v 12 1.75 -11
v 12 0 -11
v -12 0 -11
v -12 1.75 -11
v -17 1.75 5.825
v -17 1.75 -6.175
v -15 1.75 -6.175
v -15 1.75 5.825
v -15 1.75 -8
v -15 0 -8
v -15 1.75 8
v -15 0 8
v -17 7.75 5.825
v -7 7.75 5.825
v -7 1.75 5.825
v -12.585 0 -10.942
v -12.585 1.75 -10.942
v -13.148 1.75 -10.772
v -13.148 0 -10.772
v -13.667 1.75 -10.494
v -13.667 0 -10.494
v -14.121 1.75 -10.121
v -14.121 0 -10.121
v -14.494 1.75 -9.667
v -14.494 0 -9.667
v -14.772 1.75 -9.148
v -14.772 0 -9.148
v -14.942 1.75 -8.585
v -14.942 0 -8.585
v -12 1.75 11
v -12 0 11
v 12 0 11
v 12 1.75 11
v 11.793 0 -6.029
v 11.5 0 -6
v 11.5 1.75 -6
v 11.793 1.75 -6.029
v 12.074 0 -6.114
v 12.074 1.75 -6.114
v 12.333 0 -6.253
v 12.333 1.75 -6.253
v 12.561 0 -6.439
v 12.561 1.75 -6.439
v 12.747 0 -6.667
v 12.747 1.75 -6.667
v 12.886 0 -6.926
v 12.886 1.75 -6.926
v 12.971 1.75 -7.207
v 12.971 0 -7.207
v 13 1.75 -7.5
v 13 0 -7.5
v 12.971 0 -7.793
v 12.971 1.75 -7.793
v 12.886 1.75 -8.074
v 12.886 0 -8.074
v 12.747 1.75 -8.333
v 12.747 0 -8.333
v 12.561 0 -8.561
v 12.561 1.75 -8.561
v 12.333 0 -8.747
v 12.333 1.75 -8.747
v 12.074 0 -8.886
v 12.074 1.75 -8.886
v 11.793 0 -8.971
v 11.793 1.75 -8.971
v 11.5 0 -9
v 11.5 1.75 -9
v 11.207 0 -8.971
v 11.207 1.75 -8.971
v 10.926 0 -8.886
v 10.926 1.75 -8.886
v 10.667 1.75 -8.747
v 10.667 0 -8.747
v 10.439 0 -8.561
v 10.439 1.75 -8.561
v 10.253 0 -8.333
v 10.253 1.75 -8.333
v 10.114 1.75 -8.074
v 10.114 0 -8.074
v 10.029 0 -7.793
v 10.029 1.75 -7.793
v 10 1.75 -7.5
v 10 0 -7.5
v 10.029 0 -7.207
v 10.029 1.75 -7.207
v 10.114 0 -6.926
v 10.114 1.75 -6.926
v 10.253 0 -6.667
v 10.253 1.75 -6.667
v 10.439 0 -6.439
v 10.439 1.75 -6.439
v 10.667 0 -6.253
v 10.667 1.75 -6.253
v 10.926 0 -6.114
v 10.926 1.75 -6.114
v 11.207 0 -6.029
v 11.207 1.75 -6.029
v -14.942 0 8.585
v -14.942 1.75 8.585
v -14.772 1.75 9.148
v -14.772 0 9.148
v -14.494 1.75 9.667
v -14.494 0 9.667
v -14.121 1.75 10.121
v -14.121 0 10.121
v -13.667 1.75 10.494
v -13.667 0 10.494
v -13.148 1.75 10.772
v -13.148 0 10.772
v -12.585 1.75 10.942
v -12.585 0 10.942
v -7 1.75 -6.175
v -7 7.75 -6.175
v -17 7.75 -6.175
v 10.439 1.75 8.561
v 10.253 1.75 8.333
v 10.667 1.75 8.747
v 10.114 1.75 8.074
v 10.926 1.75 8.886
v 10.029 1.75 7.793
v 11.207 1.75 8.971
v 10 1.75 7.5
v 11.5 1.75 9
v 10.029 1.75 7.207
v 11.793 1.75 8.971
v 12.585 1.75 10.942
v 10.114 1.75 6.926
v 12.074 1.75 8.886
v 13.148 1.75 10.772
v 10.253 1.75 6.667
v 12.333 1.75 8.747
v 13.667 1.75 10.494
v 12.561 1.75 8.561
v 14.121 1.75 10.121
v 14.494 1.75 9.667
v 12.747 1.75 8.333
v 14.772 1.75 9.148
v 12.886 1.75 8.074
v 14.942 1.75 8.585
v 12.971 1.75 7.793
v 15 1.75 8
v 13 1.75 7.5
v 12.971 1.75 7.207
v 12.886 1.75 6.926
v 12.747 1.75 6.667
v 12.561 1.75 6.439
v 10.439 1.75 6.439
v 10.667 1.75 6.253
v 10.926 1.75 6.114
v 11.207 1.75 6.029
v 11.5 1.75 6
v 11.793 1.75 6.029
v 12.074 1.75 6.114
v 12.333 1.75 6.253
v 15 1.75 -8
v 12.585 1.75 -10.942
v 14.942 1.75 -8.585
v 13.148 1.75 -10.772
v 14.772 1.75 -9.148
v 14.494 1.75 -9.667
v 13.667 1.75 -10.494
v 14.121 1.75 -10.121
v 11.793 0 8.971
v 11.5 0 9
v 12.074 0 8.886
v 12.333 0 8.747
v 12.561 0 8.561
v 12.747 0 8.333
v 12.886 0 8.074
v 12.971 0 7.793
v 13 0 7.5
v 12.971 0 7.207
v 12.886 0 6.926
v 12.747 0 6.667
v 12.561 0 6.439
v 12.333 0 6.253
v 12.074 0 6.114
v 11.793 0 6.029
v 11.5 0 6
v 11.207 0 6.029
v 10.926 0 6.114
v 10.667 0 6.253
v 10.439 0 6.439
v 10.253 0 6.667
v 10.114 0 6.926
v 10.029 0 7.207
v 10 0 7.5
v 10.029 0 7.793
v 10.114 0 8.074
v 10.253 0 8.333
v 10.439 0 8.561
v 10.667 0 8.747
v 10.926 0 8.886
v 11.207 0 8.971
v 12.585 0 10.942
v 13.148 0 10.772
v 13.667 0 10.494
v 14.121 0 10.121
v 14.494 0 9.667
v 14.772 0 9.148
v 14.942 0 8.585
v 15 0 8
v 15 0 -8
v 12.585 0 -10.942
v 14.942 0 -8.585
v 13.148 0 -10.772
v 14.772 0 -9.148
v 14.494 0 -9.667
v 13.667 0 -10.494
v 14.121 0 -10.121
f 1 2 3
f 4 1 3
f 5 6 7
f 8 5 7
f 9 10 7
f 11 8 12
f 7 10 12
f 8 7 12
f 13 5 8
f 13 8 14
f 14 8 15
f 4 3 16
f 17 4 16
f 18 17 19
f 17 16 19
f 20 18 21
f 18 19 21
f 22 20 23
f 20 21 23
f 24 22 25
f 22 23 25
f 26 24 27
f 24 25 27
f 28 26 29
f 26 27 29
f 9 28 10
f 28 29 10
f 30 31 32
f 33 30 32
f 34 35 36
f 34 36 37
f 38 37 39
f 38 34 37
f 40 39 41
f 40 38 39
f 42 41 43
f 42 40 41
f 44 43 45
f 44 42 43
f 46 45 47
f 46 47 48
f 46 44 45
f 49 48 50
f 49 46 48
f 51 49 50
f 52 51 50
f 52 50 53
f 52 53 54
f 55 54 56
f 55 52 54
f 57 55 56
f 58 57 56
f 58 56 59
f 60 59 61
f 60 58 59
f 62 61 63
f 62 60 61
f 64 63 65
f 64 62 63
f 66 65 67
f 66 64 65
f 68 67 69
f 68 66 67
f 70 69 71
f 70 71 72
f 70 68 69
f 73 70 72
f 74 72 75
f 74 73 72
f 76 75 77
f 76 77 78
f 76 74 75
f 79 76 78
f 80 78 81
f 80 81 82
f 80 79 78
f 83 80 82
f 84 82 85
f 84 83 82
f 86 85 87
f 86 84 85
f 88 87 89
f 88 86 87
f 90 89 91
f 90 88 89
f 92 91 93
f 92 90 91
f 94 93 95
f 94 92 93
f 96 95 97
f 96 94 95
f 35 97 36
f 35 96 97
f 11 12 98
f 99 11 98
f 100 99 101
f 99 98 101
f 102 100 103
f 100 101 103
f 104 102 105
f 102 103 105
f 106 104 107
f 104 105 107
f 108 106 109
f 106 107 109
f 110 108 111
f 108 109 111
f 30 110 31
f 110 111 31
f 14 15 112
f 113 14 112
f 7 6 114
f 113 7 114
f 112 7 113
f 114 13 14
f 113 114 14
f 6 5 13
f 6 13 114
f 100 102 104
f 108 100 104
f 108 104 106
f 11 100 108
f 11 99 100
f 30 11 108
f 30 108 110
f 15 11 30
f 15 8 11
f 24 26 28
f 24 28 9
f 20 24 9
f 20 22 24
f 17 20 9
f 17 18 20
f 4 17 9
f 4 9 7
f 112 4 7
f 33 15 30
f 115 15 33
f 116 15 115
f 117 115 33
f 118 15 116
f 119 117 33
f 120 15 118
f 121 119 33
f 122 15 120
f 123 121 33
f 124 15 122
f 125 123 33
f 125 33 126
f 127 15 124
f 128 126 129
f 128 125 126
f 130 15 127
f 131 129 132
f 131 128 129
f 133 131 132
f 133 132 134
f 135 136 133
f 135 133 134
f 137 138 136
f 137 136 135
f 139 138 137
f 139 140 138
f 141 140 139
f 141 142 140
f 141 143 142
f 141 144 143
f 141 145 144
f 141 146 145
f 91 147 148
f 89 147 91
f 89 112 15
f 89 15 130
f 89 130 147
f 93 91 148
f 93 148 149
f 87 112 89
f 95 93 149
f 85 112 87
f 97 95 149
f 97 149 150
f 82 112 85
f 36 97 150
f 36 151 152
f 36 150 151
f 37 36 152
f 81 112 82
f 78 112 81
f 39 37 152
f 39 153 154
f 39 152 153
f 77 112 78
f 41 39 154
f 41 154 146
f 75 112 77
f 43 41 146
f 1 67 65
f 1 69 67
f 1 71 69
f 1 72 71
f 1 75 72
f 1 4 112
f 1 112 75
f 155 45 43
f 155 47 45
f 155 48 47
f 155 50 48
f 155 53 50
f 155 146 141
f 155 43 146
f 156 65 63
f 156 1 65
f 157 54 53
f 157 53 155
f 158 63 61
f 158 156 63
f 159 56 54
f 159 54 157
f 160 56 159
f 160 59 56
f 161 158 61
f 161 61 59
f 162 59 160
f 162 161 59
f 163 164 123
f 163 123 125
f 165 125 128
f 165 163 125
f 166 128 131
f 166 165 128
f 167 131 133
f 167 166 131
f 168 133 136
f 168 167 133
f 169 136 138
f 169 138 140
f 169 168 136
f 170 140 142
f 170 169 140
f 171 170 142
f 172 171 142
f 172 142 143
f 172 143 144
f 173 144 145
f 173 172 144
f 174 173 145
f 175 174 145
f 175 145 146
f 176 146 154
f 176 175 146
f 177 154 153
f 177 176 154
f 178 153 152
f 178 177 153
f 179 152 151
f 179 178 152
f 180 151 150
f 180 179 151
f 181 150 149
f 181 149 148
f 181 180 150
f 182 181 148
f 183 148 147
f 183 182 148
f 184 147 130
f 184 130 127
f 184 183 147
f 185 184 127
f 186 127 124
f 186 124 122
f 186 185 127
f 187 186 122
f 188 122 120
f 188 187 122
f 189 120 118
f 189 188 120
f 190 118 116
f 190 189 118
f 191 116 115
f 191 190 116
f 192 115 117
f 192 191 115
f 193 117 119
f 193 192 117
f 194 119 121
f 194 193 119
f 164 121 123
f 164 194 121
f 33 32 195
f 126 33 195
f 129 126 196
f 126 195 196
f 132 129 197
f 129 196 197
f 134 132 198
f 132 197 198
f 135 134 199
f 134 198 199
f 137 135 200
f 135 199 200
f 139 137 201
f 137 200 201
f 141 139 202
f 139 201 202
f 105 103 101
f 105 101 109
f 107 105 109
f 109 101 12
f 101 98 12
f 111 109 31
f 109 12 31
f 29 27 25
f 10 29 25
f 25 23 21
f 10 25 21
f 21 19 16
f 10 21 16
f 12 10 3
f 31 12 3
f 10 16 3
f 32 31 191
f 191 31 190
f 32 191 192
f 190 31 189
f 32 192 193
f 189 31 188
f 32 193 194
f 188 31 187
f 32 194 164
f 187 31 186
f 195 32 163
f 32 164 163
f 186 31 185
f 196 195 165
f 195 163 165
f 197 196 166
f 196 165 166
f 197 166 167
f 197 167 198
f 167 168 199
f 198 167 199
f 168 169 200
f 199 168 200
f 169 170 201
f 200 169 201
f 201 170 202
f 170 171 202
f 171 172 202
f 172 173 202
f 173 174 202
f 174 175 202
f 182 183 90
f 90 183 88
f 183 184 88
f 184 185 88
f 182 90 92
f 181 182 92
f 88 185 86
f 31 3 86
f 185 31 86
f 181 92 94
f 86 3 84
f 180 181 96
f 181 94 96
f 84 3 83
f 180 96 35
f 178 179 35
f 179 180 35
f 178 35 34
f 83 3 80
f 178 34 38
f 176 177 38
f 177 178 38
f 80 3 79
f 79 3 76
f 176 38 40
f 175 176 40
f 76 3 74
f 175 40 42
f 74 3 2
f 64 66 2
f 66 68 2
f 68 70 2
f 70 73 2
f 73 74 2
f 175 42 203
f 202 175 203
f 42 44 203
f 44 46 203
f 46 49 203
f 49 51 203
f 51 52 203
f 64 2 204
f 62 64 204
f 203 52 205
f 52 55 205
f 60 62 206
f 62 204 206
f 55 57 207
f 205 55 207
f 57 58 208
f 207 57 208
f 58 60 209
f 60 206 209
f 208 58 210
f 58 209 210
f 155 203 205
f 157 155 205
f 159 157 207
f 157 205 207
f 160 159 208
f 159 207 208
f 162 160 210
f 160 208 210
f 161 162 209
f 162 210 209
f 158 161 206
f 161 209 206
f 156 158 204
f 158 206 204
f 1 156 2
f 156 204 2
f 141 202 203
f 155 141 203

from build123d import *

# Parameters (mm, degrees)
SKETCH1_R           = 1.5
BOSS_EXTRUDE1_DEPTH = 1.75
SKETCH2_W           = 10
SKETCH2_H           = 12
BOSS_EXTRUDE2_DEPTH = 6


with BuildPart() as part:
    # Sketch1 → Boss-Extrude1 (new body)
    with BuildSketch(Plane(origin=(0, 0, 0), x_dir=(1, 0, 0), z_dir=(0, 1, 0))):
        with BuildLine():
            Line((12, 11), (-12, 11))
            ThreePointArc((-12, 11), (-14.121320344, 10.121320344), (-15, 8))
            Line((-15, 8), (-15, -8))
            ThreePointArc((-15, -8), (-14.121320344, -10.121320344), (-12, -11))
            Line((-12, -11), (12, -11))
            ThreePointArc((12, -11), (14.121320344, -10.121320344), (15, -8))
            Line((15, -8), (15, 8))
            ThreePointArc((15, 8), (14.121320344, 10.121320344), (12, 11))
        make_face()
        with Locations((11.5, 7.5)):
            Circle(SKETCH1_R, mode=Mode.SUBTRACT)
        with Locations((11.5, -7.5)):
            Circle(SKETCH1_R, mode=Mode.SUBTRACT)
    extrude(amount=BOSS_EXTRUDE1_DEPTH)

    # Sketch2 → Boss-Extrude2 (add)
    with BuildSketch(Plane(origin=(0, 1.75, 0), x_dir=(1, 0, 0), z_dir=(0, 1, 0))):
        with Locations((-12, 0.174855127)):
            Rectangle(SKETCH2_W, SKETCH2_H)
    extrude(amount=BOSS_EXTRUDE2_DEPTH)


solid = part.part
